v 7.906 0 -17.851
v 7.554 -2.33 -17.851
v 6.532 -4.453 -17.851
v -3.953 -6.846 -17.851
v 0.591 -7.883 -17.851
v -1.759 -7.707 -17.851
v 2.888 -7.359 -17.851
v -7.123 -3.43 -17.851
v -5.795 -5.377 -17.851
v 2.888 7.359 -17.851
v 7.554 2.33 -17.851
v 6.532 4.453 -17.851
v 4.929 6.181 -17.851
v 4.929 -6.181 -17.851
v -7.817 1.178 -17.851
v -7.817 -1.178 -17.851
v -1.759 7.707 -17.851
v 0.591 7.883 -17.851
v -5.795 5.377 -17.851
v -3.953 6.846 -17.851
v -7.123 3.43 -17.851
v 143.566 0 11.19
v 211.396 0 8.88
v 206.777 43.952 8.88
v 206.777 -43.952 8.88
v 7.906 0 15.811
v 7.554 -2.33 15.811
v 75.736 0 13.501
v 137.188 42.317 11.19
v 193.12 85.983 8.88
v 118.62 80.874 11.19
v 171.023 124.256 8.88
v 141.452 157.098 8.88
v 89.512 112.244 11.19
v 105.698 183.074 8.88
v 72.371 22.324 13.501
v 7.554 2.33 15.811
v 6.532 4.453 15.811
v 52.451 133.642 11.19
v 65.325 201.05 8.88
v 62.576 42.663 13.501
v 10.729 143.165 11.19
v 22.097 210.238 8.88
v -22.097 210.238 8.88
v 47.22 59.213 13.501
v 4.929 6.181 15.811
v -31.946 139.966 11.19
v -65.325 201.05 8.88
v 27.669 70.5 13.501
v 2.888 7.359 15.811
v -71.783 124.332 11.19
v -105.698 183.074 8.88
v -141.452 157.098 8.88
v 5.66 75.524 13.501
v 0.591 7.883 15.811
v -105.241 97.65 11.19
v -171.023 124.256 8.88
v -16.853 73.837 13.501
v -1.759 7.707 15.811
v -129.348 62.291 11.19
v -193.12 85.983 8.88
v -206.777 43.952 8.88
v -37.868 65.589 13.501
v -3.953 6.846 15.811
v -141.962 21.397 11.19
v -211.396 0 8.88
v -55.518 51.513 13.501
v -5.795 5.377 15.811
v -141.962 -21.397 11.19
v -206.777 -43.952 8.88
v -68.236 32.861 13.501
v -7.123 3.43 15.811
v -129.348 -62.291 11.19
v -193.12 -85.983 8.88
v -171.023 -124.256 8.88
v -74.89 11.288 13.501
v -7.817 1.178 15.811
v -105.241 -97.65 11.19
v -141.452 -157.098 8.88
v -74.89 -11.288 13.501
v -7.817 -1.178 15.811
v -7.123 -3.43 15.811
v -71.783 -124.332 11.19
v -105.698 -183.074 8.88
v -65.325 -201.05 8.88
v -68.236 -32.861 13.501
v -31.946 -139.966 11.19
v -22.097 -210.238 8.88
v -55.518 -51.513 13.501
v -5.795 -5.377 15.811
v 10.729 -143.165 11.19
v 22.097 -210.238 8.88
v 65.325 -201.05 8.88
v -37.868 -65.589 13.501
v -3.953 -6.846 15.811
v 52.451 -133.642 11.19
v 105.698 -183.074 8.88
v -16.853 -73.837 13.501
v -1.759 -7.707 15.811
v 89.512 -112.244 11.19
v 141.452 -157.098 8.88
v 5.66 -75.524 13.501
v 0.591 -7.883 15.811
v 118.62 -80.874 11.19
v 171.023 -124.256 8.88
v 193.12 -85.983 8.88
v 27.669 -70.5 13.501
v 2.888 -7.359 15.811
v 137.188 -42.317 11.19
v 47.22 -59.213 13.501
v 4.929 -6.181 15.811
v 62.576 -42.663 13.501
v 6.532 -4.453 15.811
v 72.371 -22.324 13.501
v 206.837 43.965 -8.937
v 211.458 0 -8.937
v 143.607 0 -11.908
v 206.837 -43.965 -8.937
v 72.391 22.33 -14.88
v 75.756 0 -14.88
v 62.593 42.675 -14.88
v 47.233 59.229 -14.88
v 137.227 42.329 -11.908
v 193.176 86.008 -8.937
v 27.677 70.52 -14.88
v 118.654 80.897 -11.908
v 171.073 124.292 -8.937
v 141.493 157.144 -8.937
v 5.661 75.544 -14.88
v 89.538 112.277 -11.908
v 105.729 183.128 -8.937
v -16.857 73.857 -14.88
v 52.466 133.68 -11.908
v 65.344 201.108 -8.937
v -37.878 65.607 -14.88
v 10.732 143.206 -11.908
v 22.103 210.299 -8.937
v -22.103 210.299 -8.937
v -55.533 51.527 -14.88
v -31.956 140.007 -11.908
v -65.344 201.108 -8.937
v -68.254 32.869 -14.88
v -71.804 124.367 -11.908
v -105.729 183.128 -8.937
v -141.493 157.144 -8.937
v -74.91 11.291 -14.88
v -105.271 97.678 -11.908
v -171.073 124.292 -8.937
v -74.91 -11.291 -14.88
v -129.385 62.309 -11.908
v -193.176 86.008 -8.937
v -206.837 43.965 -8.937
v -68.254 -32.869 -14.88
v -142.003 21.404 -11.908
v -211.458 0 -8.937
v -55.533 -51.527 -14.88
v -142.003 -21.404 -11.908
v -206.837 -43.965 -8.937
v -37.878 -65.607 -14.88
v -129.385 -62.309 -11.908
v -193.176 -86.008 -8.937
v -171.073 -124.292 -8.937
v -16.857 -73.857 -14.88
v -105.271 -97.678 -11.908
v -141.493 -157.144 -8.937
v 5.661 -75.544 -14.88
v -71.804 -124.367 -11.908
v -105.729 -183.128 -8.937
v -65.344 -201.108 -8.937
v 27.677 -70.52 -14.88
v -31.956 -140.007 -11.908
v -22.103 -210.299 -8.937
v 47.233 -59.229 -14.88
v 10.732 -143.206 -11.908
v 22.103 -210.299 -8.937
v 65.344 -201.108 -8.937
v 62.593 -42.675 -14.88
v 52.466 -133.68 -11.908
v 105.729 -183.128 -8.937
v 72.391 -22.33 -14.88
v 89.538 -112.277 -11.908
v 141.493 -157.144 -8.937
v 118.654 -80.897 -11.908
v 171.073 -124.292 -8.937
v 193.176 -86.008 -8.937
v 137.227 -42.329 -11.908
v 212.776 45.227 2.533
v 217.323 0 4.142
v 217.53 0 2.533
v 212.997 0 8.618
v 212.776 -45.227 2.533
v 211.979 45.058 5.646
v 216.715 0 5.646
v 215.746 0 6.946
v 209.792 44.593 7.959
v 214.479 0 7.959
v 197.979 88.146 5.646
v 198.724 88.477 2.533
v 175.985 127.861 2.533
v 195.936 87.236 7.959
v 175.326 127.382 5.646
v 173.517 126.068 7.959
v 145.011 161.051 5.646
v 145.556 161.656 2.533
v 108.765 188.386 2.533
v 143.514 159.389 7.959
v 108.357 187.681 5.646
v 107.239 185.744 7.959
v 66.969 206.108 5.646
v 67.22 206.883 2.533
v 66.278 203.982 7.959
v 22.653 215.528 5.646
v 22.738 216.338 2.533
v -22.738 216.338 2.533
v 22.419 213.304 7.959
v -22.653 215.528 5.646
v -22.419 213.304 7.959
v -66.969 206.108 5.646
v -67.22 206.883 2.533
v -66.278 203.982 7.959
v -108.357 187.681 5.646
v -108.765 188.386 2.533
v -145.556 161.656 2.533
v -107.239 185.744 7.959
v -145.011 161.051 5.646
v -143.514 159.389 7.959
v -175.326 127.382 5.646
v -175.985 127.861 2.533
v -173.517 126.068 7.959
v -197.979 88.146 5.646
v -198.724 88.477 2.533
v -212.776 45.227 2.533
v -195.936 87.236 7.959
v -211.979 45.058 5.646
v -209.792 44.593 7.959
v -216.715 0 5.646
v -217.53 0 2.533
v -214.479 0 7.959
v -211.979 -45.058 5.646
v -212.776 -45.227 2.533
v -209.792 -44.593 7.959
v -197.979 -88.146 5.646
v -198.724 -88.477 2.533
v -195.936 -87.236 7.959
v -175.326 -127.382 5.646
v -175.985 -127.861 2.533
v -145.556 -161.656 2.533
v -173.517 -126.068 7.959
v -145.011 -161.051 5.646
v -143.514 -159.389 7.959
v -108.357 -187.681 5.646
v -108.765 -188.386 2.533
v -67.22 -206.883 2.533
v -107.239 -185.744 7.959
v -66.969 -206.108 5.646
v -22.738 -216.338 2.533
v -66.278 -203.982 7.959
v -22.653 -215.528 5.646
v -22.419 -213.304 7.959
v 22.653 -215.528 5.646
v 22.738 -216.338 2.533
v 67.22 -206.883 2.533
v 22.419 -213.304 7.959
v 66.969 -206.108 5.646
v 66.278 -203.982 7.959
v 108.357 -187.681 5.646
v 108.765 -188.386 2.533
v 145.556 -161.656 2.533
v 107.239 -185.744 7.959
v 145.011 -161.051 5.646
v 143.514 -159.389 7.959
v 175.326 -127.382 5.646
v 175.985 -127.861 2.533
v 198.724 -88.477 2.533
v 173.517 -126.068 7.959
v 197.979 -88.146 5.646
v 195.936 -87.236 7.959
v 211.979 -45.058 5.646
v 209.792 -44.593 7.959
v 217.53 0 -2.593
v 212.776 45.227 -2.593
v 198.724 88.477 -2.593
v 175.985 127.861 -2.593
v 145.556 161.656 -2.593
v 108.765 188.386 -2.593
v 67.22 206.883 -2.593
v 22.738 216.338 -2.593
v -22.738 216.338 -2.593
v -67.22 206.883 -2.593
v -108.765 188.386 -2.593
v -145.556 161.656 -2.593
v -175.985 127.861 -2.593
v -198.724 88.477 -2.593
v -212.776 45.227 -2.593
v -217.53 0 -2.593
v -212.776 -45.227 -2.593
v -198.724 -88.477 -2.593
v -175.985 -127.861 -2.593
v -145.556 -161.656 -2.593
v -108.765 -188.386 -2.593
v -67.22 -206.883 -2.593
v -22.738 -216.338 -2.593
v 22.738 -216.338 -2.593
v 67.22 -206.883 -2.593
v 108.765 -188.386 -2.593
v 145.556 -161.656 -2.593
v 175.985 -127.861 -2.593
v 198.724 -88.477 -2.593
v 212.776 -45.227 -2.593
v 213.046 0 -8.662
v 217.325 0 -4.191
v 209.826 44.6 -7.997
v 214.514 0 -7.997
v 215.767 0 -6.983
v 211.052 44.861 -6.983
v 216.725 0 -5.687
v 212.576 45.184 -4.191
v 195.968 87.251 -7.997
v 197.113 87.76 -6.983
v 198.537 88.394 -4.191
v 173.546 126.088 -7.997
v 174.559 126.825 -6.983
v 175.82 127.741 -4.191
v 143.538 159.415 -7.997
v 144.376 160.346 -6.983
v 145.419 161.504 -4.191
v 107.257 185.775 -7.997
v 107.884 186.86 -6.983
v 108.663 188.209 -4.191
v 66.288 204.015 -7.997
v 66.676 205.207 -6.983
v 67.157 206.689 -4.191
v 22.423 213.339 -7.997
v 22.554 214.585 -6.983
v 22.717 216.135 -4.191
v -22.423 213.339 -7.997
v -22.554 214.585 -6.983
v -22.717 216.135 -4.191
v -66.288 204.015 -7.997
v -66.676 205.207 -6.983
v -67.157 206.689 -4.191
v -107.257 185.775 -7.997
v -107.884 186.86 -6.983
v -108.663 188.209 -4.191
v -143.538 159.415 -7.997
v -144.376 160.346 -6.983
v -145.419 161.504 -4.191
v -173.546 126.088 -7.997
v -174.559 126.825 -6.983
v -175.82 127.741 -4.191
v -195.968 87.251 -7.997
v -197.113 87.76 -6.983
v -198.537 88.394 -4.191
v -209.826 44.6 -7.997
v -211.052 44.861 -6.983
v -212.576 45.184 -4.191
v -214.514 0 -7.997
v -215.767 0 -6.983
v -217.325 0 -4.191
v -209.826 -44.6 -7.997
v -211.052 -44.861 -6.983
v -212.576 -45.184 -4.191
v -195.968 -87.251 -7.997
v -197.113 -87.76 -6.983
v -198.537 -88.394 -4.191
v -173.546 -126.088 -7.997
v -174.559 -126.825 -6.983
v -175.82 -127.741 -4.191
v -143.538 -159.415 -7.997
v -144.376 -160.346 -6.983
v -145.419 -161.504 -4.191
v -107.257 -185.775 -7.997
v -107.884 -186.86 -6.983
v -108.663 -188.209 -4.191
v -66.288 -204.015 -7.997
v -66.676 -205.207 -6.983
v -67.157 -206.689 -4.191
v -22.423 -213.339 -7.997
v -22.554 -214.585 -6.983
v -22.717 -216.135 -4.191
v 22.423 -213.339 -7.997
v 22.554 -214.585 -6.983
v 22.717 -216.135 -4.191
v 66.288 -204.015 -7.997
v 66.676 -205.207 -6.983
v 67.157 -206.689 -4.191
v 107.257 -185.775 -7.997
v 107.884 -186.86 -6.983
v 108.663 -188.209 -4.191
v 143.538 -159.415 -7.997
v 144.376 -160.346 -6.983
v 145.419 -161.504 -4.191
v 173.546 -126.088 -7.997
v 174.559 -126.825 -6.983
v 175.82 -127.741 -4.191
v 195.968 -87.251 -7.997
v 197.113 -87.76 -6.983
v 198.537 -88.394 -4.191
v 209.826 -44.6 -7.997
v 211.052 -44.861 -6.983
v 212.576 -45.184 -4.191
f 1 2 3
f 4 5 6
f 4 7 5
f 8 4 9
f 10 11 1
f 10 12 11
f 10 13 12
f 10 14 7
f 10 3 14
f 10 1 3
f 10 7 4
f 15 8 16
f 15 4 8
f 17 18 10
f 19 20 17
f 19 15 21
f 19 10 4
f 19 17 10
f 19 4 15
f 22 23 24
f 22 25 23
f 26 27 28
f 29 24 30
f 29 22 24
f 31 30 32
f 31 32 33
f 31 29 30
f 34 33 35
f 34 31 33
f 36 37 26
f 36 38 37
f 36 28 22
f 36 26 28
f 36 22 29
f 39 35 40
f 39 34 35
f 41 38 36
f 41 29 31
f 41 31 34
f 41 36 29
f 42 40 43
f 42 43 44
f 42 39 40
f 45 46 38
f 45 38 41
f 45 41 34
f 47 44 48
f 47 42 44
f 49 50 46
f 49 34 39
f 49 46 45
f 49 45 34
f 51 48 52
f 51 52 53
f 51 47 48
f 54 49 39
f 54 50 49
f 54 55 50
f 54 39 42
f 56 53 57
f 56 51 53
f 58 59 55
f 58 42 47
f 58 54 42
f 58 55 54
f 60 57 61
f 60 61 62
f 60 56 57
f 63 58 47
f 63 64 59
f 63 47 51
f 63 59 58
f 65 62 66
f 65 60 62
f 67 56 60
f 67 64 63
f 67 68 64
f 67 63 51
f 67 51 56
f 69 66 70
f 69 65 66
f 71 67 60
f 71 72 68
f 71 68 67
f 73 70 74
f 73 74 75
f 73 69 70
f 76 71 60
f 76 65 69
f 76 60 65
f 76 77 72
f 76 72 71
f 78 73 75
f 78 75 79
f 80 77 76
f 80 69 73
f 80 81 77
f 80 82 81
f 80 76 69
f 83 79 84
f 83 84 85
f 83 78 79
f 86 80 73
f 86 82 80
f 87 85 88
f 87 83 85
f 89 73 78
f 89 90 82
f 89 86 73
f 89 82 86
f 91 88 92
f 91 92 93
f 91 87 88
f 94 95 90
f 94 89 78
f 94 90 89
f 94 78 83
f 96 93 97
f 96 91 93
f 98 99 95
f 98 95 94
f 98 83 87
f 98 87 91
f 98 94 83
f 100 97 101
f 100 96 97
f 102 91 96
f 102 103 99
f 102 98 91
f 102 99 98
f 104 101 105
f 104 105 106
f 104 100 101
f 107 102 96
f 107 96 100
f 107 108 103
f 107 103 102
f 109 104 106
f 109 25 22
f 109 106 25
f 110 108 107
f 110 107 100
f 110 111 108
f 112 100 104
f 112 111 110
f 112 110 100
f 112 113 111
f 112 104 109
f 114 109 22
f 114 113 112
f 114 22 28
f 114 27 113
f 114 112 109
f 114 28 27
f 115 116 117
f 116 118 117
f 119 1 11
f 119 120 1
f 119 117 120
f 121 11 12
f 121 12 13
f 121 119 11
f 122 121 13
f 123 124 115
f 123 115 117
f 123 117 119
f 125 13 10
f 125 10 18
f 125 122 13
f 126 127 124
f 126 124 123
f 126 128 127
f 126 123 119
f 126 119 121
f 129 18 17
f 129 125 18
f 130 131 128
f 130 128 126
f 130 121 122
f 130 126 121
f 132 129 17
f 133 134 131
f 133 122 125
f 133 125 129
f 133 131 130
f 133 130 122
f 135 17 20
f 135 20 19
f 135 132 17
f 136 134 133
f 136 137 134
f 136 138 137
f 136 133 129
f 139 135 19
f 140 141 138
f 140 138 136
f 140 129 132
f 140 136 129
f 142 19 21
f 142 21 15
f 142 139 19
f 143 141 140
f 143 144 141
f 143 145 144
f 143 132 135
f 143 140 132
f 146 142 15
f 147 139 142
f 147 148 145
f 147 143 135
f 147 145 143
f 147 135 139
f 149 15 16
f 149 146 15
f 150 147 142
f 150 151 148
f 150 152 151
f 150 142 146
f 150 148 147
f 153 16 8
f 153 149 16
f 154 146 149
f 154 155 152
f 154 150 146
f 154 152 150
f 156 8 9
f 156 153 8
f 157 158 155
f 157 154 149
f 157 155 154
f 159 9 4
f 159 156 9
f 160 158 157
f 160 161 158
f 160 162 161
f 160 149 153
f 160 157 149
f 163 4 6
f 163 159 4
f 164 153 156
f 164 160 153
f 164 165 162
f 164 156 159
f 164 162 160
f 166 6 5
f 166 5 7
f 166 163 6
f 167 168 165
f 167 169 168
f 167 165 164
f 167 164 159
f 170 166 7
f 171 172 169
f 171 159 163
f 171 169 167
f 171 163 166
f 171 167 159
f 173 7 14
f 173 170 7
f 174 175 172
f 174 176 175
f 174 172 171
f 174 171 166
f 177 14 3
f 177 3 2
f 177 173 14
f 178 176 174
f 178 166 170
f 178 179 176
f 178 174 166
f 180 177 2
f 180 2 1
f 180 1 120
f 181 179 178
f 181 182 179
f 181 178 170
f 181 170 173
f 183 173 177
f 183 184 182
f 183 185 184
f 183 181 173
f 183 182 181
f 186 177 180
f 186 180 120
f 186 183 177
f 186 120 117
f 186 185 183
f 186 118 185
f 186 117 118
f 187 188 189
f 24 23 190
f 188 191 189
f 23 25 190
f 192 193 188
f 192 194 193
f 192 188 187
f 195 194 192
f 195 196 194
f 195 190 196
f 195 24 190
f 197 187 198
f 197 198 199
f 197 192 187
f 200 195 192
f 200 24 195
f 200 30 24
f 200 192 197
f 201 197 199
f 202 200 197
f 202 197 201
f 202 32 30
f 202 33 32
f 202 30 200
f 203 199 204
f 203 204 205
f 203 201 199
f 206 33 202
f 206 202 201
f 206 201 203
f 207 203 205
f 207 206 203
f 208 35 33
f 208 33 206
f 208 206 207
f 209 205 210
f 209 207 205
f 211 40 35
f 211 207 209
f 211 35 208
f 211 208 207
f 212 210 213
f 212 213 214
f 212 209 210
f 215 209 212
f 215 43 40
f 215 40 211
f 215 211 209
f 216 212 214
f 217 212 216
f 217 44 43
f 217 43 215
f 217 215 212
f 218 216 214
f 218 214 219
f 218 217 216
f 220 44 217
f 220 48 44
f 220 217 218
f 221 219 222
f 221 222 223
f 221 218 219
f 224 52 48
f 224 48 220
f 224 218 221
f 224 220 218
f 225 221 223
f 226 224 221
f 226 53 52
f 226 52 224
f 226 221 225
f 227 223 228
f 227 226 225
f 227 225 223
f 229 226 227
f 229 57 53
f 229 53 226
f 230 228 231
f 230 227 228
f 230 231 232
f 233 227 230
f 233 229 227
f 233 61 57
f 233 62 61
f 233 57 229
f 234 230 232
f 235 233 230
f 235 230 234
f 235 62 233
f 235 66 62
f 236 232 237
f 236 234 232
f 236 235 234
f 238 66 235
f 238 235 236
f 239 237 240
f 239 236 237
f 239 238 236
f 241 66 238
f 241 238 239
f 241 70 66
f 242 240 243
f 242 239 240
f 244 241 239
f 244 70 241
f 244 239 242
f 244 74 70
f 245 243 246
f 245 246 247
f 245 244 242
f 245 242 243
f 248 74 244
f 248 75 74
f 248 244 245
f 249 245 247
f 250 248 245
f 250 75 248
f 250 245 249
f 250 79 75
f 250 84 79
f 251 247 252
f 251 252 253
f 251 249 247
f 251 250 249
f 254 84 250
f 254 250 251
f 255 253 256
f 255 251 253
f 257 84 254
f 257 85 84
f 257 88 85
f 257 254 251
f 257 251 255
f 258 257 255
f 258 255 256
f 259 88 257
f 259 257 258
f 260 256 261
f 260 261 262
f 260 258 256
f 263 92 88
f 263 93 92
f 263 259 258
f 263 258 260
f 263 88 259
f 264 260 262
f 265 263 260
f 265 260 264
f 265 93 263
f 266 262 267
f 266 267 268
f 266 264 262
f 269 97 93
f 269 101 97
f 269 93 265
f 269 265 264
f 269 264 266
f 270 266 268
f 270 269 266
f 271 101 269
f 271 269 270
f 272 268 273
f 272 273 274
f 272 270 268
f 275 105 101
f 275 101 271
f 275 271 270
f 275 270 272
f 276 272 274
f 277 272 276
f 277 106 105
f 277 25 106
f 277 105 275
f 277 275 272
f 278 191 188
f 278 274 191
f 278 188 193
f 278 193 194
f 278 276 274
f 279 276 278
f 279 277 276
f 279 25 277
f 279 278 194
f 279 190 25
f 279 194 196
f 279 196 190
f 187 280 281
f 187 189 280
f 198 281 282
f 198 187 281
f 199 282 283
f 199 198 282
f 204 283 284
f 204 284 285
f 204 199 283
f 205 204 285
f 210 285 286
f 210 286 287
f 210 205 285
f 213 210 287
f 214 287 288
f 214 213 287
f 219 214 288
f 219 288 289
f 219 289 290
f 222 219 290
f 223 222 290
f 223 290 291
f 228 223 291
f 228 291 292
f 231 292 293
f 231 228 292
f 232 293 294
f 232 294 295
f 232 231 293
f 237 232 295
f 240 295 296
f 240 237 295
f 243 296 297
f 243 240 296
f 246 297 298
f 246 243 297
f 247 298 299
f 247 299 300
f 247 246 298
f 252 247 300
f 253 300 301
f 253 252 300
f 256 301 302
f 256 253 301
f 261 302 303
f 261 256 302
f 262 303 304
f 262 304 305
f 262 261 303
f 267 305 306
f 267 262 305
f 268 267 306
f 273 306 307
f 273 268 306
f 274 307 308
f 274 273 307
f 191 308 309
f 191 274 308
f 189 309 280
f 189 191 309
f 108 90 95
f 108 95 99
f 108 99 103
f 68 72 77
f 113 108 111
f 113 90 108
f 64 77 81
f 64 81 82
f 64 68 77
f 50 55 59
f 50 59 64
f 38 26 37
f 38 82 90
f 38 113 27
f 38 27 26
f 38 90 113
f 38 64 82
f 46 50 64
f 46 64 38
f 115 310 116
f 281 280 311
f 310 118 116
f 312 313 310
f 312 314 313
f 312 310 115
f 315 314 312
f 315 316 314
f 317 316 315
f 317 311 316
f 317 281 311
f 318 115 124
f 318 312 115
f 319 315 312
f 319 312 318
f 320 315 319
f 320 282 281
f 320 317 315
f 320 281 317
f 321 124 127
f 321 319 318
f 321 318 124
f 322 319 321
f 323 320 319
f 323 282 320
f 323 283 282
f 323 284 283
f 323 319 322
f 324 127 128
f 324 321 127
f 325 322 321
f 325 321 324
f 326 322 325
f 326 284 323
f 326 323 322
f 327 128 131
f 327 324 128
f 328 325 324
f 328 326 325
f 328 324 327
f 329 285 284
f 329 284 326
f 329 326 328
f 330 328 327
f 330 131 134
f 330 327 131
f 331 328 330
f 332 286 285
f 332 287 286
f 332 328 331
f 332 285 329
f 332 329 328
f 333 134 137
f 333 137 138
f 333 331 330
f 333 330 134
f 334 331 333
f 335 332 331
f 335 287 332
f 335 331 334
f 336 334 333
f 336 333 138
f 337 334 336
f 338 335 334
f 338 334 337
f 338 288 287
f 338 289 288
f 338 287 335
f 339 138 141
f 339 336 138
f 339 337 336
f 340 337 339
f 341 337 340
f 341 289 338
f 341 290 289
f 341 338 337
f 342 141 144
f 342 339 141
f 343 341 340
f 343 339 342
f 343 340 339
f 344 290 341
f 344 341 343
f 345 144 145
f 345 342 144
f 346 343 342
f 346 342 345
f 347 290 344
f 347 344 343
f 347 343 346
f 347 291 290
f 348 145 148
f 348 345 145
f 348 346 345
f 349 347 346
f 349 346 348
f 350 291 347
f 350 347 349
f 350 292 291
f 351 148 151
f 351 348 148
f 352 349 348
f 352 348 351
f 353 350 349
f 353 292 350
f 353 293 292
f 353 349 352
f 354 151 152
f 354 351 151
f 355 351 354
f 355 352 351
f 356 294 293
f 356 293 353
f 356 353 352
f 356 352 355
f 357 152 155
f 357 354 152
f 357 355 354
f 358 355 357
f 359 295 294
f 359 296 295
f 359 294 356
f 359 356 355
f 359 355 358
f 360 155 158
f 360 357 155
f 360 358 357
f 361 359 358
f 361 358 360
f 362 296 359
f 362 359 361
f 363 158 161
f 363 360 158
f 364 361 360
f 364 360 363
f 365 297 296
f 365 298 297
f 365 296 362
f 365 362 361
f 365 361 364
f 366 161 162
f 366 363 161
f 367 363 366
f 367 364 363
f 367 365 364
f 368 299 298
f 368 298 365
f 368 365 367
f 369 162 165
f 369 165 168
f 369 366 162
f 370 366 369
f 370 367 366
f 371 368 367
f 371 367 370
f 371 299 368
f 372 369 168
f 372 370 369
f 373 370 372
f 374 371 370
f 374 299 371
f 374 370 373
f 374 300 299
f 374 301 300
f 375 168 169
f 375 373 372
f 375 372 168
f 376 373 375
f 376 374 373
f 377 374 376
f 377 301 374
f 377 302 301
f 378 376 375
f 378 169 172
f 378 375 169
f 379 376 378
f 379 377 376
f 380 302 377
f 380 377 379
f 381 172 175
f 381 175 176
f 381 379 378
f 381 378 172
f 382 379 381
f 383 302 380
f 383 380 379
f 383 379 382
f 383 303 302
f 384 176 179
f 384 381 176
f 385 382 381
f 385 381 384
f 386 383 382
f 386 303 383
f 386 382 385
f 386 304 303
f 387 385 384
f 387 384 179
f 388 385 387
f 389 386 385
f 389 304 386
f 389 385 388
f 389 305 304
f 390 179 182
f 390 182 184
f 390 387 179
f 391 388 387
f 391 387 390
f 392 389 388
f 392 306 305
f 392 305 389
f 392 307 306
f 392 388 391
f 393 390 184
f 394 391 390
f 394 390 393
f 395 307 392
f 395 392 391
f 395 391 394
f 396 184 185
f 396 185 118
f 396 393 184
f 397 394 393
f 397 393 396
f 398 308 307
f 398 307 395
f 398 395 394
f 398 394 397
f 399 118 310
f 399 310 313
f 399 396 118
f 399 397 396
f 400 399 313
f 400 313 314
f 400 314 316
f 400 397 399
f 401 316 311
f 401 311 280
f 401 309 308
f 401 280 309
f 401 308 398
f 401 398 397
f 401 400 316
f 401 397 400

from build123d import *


with BuildPart() as f1:
    # F0 (on Front) → F1 (revolve)
    with BuildSketch(Plane.XZ):
        with BuildLine():
            Line((211.396159, 8.87954), (7.905546, 15.811093))
            Line((7.905546, 15.811093), (0, 15.811093))
            Line((0, 15.811093), (0, -17.851226))
            Line((0, -17.851226), (7.905546, -17.851226))
            Line((7.905546, -17.851226), (211.457818, -8.936529))
            ThreePointArc((211.457818, -8.936529), (215.767289, -6.983409), (217.529982, -2.59261))
            Line((217.529982, -2.59261), (217.529982, 2.533221))
            ThreePointArc((217.529982, 2.533221), (215.745901, 6.946257), (211.396159, 8.87954))
        make_face()
    revolve(axis=Axis((0, 0, -1.020066), (0, 0, 1)))


solid = f1.part
